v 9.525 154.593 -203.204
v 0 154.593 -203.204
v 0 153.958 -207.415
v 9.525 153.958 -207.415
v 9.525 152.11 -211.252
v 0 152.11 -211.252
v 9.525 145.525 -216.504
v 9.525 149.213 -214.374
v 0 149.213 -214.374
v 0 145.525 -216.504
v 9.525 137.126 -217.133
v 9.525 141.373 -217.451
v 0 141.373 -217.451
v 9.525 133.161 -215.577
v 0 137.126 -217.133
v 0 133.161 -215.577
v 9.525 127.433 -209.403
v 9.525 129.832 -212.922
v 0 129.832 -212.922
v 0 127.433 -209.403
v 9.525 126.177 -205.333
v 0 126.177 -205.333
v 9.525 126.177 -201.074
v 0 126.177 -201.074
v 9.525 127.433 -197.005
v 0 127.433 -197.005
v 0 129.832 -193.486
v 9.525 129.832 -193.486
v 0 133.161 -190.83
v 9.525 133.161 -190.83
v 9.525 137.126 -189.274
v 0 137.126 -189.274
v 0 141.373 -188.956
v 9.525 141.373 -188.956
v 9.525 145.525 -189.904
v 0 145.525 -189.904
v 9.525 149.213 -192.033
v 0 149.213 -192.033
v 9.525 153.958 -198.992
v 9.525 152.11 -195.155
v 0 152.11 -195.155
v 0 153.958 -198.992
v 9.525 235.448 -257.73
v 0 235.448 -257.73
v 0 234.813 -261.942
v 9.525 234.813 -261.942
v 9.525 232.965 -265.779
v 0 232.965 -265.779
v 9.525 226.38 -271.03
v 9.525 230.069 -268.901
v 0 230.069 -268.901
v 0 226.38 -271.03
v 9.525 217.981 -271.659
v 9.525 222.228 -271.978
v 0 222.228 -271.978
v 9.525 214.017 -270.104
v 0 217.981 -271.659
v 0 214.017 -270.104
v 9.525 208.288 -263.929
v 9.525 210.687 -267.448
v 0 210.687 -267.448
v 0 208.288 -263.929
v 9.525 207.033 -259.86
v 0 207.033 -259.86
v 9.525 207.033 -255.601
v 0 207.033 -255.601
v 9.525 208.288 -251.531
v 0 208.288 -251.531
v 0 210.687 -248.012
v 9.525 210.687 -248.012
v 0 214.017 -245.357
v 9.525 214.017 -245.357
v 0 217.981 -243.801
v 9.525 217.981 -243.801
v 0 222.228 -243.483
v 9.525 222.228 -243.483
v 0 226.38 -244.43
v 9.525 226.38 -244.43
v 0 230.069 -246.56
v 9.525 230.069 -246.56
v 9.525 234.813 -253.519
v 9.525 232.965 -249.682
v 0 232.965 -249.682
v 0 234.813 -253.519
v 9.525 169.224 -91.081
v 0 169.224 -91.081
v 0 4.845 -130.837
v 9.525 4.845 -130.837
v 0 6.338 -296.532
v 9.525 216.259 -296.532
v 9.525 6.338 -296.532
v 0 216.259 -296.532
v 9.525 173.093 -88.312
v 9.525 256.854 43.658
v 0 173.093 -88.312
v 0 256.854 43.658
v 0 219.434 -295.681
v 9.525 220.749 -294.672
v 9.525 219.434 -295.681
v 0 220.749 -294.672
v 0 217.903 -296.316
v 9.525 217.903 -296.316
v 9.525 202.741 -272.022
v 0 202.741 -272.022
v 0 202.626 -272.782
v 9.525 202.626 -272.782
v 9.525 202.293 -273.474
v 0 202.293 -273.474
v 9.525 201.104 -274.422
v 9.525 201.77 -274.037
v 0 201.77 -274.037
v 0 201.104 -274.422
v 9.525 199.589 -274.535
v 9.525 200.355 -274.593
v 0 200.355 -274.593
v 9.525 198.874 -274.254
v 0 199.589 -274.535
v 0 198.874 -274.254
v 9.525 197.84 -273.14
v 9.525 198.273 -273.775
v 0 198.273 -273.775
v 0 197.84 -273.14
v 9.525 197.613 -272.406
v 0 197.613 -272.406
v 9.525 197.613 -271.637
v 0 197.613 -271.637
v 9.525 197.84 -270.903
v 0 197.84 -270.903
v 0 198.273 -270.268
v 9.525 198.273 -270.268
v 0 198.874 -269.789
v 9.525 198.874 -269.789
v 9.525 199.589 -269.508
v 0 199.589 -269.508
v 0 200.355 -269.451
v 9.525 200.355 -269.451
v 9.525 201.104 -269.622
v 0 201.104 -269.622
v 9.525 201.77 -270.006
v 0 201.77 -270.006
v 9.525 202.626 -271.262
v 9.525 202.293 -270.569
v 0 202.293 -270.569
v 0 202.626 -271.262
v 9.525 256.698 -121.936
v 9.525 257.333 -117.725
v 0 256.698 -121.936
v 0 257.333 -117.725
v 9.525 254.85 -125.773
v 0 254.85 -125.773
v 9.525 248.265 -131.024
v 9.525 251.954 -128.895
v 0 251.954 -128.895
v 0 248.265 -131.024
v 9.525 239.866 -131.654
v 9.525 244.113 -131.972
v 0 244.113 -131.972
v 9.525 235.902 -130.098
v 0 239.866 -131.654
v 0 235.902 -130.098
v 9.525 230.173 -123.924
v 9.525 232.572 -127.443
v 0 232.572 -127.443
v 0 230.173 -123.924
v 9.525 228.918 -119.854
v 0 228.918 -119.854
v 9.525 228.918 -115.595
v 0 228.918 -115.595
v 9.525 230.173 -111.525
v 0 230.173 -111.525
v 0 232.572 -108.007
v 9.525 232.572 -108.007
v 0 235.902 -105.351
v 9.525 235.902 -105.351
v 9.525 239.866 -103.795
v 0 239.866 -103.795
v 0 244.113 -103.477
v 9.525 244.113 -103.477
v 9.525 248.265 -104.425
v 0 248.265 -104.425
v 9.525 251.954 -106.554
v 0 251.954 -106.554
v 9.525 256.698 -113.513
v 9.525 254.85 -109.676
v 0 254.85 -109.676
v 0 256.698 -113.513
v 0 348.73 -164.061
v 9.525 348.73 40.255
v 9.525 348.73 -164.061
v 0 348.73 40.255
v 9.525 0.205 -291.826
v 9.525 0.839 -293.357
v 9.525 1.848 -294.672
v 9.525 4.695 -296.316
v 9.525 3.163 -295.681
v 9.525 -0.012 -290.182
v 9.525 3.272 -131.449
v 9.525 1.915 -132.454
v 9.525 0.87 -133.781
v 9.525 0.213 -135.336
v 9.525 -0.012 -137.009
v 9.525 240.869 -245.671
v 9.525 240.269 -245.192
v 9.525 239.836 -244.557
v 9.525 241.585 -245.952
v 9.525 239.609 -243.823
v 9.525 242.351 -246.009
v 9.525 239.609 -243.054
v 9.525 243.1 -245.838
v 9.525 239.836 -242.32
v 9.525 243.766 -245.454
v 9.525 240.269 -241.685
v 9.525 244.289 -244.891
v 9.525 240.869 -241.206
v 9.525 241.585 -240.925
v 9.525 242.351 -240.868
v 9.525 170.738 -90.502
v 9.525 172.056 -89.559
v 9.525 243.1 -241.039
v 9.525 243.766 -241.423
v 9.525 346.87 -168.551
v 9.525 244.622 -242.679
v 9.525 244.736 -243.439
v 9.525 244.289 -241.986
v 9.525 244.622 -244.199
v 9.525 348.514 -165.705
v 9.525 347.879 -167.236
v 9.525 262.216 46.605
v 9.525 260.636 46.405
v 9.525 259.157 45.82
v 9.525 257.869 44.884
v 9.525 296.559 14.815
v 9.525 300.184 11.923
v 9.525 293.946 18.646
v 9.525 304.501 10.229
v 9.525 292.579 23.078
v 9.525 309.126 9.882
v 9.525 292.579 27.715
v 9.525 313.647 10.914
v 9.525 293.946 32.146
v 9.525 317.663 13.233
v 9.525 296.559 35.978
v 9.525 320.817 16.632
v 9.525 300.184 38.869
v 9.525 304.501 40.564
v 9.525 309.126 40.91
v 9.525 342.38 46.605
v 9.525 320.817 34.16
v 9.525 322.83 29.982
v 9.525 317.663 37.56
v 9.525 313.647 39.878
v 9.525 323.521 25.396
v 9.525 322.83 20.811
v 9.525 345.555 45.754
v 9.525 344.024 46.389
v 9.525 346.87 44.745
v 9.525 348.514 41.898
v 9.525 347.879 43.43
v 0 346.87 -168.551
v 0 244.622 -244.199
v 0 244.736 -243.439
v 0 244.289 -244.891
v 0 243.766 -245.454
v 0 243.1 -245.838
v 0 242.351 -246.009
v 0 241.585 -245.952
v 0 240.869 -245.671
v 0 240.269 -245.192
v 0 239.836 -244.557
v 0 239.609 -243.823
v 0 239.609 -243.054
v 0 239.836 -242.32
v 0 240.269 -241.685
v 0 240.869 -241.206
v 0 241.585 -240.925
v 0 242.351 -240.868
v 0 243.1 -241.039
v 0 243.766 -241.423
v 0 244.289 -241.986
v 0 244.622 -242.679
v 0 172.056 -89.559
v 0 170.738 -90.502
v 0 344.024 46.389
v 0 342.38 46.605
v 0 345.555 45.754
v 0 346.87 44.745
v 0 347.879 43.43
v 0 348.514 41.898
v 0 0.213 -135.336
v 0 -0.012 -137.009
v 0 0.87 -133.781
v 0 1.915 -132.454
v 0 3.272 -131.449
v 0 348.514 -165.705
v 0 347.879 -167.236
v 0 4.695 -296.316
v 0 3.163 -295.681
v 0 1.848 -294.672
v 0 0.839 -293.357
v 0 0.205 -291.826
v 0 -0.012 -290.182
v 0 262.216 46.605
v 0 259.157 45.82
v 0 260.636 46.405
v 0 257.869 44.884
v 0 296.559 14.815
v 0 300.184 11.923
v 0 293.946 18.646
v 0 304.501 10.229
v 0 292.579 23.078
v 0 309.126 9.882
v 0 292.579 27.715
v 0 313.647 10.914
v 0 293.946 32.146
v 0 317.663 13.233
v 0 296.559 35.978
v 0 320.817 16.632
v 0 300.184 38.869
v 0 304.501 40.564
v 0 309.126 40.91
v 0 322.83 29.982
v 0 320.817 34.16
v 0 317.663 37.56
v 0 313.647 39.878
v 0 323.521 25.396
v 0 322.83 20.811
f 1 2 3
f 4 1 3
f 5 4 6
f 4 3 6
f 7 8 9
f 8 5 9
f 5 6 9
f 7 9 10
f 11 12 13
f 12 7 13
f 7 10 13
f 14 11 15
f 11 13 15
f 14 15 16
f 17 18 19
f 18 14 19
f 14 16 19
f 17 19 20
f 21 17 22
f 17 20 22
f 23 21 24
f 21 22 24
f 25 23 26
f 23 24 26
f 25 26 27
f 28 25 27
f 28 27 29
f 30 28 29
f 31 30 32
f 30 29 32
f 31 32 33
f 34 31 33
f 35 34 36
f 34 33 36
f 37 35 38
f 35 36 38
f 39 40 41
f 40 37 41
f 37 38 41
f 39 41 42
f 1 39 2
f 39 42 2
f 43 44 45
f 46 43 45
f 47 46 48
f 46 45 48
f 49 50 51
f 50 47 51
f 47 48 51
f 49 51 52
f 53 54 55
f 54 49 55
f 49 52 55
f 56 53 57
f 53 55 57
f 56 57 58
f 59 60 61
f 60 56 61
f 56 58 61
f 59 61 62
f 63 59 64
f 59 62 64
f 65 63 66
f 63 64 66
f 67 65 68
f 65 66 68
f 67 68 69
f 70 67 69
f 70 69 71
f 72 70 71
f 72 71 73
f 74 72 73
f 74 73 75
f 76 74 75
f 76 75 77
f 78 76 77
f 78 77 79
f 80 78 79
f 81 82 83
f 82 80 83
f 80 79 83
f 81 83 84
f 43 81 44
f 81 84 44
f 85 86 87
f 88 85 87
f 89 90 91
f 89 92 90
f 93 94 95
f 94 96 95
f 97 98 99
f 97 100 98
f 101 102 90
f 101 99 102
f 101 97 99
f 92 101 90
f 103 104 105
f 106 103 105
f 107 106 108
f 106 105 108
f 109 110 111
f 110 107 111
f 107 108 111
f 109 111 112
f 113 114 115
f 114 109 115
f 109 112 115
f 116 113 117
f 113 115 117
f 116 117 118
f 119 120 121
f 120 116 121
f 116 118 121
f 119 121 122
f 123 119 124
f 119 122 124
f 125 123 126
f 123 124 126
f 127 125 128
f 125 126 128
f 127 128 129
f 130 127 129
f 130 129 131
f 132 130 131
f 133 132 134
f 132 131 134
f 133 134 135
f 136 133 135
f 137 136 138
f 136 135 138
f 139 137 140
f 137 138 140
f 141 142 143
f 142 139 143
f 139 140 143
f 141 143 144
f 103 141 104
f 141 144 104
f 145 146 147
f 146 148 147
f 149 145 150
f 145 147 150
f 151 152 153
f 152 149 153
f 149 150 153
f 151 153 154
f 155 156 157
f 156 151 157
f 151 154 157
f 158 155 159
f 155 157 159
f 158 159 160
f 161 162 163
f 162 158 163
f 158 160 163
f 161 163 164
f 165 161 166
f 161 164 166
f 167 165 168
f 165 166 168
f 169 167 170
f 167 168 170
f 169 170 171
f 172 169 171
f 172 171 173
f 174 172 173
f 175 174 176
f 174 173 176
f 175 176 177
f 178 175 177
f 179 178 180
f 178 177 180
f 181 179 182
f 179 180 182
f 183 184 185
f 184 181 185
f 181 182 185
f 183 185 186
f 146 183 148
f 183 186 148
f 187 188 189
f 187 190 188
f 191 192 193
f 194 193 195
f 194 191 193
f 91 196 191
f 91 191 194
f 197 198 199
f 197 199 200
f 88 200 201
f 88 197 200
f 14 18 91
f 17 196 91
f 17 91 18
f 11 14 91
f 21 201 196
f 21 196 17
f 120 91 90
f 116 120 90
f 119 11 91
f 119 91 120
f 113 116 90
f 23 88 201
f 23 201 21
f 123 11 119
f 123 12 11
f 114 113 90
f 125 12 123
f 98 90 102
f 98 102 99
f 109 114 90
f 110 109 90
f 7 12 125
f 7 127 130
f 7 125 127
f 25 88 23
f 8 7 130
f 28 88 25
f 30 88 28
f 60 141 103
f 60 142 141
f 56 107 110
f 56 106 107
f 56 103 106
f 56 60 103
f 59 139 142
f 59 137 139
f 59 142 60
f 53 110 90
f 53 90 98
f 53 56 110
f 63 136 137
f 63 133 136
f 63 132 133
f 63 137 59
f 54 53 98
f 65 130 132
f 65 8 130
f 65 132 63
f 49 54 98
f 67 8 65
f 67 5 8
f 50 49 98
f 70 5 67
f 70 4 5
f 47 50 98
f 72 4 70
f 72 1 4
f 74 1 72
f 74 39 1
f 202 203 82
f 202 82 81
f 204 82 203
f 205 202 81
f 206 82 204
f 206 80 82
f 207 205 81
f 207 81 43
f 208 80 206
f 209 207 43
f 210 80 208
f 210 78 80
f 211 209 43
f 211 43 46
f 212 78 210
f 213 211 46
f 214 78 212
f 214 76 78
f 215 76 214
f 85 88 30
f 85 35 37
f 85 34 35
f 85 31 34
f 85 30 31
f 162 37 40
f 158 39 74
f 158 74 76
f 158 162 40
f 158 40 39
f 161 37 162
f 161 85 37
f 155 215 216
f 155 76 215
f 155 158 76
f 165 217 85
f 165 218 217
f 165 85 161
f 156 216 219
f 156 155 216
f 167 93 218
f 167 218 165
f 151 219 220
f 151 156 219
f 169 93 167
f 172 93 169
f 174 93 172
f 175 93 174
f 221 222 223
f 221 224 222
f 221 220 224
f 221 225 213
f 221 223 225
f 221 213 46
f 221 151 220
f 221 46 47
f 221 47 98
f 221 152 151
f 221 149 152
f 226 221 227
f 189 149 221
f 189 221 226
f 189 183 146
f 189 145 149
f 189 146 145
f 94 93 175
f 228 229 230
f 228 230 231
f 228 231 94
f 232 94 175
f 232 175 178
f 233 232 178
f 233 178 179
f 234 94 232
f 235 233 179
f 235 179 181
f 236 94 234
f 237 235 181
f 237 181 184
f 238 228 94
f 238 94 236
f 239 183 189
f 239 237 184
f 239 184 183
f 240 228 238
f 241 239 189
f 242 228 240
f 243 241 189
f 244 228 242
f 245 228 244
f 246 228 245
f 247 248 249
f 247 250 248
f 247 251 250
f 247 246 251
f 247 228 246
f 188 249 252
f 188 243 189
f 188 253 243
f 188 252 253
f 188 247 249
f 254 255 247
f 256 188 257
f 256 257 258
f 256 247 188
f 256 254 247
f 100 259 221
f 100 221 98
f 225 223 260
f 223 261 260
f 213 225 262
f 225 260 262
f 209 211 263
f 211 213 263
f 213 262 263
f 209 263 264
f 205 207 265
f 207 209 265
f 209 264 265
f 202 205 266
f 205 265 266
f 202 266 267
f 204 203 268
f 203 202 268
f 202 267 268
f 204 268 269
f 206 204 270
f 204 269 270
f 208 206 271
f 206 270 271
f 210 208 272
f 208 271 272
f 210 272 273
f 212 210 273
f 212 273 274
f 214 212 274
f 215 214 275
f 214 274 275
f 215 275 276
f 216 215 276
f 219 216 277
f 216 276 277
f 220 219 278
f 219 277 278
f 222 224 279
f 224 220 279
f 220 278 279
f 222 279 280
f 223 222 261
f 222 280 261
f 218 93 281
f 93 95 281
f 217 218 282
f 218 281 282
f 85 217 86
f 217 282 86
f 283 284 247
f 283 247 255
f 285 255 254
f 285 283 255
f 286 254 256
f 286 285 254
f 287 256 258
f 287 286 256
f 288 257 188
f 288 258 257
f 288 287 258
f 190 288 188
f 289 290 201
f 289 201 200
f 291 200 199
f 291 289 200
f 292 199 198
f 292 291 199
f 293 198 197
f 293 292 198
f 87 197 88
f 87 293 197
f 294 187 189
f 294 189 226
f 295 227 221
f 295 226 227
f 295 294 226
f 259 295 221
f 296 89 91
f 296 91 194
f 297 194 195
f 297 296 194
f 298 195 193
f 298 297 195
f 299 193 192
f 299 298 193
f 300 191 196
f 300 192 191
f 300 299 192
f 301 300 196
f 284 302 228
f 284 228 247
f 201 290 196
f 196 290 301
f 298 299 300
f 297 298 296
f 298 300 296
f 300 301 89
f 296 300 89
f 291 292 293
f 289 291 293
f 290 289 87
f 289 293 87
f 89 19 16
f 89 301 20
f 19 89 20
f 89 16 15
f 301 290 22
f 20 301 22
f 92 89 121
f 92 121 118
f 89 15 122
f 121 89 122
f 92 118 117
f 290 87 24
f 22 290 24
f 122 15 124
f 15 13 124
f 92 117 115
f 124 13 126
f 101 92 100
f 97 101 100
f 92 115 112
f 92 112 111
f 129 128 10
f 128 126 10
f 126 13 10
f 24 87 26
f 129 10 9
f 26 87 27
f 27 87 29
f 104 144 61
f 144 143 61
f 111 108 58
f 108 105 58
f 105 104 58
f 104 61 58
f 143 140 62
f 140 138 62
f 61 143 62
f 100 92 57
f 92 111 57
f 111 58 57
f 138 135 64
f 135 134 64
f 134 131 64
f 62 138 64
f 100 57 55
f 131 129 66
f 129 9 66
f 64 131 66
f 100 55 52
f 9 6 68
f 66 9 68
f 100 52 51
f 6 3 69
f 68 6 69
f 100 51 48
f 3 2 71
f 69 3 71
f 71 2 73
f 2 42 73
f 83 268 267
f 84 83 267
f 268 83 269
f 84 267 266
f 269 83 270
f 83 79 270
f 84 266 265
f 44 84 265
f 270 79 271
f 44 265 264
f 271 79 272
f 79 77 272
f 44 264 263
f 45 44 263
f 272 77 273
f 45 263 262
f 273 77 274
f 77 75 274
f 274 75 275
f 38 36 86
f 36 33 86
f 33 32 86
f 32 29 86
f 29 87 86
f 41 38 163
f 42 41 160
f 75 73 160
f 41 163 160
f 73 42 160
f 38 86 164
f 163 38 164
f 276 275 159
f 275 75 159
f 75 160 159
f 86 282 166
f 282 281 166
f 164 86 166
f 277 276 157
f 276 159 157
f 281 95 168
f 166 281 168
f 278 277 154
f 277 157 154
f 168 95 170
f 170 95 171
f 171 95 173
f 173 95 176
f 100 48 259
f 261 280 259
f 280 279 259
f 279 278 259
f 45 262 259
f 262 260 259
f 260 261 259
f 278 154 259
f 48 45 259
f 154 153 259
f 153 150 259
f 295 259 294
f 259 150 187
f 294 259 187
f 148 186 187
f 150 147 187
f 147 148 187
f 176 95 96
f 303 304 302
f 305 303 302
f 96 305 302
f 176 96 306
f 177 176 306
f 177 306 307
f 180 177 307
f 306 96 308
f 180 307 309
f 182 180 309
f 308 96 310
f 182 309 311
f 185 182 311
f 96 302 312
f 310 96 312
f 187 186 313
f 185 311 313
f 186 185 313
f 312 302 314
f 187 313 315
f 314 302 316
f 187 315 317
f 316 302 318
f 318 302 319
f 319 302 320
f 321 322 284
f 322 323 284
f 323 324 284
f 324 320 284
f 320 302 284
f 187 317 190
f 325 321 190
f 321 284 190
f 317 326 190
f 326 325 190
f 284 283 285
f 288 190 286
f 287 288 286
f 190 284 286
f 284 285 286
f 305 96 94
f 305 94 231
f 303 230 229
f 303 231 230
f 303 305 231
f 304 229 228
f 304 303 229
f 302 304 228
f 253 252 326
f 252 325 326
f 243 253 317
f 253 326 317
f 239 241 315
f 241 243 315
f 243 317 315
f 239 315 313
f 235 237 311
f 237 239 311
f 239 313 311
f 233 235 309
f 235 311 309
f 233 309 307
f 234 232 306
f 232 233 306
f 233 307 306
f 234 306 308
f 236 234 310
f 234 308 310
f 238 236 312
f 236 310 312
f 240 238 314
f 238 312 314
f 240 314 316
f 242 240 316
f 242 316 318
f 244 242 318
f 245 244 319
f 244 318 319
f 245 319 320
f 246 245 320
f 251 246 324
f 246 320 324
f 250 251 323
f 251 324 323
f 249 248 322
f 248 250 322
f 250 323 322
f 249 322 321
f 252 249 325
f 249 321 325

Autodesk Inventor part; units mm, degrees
ref_plane "YZ Plane" through (0, 0, 0) normal (1, 0, 0) x (0, 1, 0)
ref_plane "XZ Plane" through (0, 0, 0) normal (0, 1, 0) x (-1, 0, 0)
ref_plane "XY Plane" through (0, 0, 0) normal (0, 0, 1) x (1, 0, 0)
sketch "Sketch1" plane through (0, 0, 0) normal (1, 0, 0) x (0, 1, 0)
  line L0 (348.73, -1.5913) -> (348.73, -164.0611)
  line L1 (346.8701, -168.5512) -> (220.7492, -294.6721)
  line L2 (216.2591, -296.532) -> (6.3382, -296.532)
  circle A0 centre (307.9632, 25.3963) radius 15.5575
  line L3 (348.73, -1.5913) -> (348.73, 40.2549)
  line L4 (-0.0118, -137.0094) -> (-0.0118, -290.182)
  arc A1 (-0.0118, -290.182) -> (6.3382, -296.532) centre (6.3382, -290.182) ccw
  arc A2 (216.2591, -296.532) -> (220.7492, -294.6721) centre (216.2591, -290.182) ccw
  arc A3 (346.8701, -168.5512) -> (348.73, -164.0611) centre (342.38, -164.0611) ccw
  circle A4 centre (243.0455, -117.7246) radius 14.2875
  circle A5 centre (243.0455, -117.7246) radius 38.1 construction
  circle A6 centre (140.3051, -203.2037) radius 38.1 construction
  circle A7 centre (140.3051, -203.2037) radius 14.2875
  circle A8 centre (200.1626, -272.0217) radius 2.5781
  circle A9 centre (221.1605, -257.7302) radius 14.2875
  circle A10 centre (242.1584, -243.4386) radius 2.5781
  line L5 (262.2155, 46.6049) -> (342.38, 46.6049)
  arc A11 (348.73, 40.2549) -> (342.38, 46.6049) centre (342.38, 40.2549) ccw
  line L6 (256.8542, 43.6577) -> (173.0926, -88.3121)
  line L7 (169.224, -91.0813) -> (4.8454, -130.8373)
  arc A12 (262.2155, 46.6049) -> (256.8542, 43.6577) centre (262.2155, 40.2549) ccw
  arc A13 (169.224, -91.0813) -> (173.0926, -88.3121) centre (167.7313, -84.9093) ccw
  arc A14 (4.8454, -130.8373) -> (-0.0118, -137.0094) centre (6.3382, -137.0094) ccw
  line L8 (292.4057, 46.6049) -> (191.3384, -59.565)
  point P0 (348.73, -166.6913)
  point P1 (182.4228, -257.7338)
  point P2 (269.24, 25.4)
  point P3 (171.7177, -90.4782)
  point P4 (258.7248, 46.6049)
  point P5 (-0.0118, -132.0121)
  dimension "d49" = 28.575
  dimension "d50" = 76.2
  dimension "d51" = 76.2
  dimension "d52" = 28.575
  dimension "d53" = 28.575
  dimension "d54" = 5.1562
  dimension "d56" = 6.35
  dimension "d57" = 6.35
extrude "Extrusion1" add sketch "Sketch1" along normal blind 9.525
properties part number "Intake-v2"
